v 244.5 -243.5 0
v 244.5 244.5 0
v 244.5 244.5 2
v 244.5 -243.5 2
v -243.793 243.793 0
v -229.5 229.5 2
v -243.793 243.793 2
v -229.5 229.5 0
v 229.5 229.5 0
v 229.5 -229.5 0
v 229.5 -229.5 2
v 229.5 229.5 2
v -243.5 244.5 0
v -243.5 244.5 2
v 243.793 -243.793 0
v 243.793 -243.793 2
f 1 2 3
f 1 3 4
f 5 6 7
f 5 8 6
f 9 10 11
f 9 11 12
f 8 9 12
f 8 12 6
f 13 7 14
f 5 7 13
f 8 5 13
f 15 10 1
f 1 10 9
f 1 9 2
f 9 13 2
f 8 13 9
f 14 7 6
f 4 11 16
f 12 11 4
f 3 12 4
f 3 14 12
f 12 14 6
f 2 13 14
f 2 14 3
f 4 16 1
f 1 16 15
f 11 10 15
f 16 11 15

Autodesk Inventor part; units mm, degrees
ref_plane "YZ Plane" through (0, 0, 0) normal (1, 0, 0) x (0, 1, 0)
ref_plane "XZ Plane" through (0, 0, 0) normal (0, 1, 0) x (-1, 0, 0)
ref_plane "XY Plane" through (0, 0, 0) normal (0, 0, 1) x (1, 0, 0)
sketch "Sketch1" plane through (0, 0, 0) normal (0, 0, 1) x (1, 0, 0)
  line L0 (-244.5, 244.5) -> (244.5, 244.5)
  line L1 (244.5, 244.5) -> (244.5, -244.5)
  line L2 (244.5, -244.5) -> (-244.5, -244.5)
  line L3 (-244.5, -244.5) -> (-244.5, 244.5)
  line L4 (-244.5, 244.5) -> (244.5, -244.5) construction
  line L5 (244.5, 244.5) -> (-244.5, -244.5) construction
  line L6 (-229.5, -229.5) -> (229.5, -229.5)
  line L7 (229.5, -229.5) -> (229.5, 229.5)
  line L8 (229.5, 229.5) -> (-229.5, 229.5)
  line L9 (-229.5, 229.5) -> (-229.5, -229.5)
  line L10 (-229.5, -229.5) -> (229.5, 229.5) construction
  line L11 (229.5, -229.5) -> (-229.5, 229.5) construction
  line L12 (-229.5, 229.5) -> (-244.5, 244.5)
  line L13 (229.5, -229.5) -> (244.5, -244.5)
  point P0 (0, 0)
  dimension "d1" = 489
  dimension "d18" = 15
  dimension "d19" = 489
extrude "Plate1" add sketch "Sketch1" along normal blind 2 contours L0 L1 L13 L7 L8 L12
chamfer "Corner Chamfer1" distance 1 angle 45 2 edges at (-244.5, 244.5, 1) (244.5, -244.5, 1)
equation "\"d19\" = d1"
equation "\"d3\" = Thickness"
equation "\"BendRadius\" = Thickness"
equation "\"BendReliefWidth\" = Thickness"
equation "\"BendReliefDepth\" = 0.5 * Thickness"
equation "\"CornerReliefSize\" = 4 * Thickness"
equation "\"MinimumRemnant\" = 2 * Thickness"
equation "\"TransitionRadius\" = BendRadius"
equation "\"JacobiRadiusSize\" = BendRadius"
equation "\"GapSize\" = Thickness"
equation "\"Thickness\" = 2"
properties part number "PNS waste water bin 06"
